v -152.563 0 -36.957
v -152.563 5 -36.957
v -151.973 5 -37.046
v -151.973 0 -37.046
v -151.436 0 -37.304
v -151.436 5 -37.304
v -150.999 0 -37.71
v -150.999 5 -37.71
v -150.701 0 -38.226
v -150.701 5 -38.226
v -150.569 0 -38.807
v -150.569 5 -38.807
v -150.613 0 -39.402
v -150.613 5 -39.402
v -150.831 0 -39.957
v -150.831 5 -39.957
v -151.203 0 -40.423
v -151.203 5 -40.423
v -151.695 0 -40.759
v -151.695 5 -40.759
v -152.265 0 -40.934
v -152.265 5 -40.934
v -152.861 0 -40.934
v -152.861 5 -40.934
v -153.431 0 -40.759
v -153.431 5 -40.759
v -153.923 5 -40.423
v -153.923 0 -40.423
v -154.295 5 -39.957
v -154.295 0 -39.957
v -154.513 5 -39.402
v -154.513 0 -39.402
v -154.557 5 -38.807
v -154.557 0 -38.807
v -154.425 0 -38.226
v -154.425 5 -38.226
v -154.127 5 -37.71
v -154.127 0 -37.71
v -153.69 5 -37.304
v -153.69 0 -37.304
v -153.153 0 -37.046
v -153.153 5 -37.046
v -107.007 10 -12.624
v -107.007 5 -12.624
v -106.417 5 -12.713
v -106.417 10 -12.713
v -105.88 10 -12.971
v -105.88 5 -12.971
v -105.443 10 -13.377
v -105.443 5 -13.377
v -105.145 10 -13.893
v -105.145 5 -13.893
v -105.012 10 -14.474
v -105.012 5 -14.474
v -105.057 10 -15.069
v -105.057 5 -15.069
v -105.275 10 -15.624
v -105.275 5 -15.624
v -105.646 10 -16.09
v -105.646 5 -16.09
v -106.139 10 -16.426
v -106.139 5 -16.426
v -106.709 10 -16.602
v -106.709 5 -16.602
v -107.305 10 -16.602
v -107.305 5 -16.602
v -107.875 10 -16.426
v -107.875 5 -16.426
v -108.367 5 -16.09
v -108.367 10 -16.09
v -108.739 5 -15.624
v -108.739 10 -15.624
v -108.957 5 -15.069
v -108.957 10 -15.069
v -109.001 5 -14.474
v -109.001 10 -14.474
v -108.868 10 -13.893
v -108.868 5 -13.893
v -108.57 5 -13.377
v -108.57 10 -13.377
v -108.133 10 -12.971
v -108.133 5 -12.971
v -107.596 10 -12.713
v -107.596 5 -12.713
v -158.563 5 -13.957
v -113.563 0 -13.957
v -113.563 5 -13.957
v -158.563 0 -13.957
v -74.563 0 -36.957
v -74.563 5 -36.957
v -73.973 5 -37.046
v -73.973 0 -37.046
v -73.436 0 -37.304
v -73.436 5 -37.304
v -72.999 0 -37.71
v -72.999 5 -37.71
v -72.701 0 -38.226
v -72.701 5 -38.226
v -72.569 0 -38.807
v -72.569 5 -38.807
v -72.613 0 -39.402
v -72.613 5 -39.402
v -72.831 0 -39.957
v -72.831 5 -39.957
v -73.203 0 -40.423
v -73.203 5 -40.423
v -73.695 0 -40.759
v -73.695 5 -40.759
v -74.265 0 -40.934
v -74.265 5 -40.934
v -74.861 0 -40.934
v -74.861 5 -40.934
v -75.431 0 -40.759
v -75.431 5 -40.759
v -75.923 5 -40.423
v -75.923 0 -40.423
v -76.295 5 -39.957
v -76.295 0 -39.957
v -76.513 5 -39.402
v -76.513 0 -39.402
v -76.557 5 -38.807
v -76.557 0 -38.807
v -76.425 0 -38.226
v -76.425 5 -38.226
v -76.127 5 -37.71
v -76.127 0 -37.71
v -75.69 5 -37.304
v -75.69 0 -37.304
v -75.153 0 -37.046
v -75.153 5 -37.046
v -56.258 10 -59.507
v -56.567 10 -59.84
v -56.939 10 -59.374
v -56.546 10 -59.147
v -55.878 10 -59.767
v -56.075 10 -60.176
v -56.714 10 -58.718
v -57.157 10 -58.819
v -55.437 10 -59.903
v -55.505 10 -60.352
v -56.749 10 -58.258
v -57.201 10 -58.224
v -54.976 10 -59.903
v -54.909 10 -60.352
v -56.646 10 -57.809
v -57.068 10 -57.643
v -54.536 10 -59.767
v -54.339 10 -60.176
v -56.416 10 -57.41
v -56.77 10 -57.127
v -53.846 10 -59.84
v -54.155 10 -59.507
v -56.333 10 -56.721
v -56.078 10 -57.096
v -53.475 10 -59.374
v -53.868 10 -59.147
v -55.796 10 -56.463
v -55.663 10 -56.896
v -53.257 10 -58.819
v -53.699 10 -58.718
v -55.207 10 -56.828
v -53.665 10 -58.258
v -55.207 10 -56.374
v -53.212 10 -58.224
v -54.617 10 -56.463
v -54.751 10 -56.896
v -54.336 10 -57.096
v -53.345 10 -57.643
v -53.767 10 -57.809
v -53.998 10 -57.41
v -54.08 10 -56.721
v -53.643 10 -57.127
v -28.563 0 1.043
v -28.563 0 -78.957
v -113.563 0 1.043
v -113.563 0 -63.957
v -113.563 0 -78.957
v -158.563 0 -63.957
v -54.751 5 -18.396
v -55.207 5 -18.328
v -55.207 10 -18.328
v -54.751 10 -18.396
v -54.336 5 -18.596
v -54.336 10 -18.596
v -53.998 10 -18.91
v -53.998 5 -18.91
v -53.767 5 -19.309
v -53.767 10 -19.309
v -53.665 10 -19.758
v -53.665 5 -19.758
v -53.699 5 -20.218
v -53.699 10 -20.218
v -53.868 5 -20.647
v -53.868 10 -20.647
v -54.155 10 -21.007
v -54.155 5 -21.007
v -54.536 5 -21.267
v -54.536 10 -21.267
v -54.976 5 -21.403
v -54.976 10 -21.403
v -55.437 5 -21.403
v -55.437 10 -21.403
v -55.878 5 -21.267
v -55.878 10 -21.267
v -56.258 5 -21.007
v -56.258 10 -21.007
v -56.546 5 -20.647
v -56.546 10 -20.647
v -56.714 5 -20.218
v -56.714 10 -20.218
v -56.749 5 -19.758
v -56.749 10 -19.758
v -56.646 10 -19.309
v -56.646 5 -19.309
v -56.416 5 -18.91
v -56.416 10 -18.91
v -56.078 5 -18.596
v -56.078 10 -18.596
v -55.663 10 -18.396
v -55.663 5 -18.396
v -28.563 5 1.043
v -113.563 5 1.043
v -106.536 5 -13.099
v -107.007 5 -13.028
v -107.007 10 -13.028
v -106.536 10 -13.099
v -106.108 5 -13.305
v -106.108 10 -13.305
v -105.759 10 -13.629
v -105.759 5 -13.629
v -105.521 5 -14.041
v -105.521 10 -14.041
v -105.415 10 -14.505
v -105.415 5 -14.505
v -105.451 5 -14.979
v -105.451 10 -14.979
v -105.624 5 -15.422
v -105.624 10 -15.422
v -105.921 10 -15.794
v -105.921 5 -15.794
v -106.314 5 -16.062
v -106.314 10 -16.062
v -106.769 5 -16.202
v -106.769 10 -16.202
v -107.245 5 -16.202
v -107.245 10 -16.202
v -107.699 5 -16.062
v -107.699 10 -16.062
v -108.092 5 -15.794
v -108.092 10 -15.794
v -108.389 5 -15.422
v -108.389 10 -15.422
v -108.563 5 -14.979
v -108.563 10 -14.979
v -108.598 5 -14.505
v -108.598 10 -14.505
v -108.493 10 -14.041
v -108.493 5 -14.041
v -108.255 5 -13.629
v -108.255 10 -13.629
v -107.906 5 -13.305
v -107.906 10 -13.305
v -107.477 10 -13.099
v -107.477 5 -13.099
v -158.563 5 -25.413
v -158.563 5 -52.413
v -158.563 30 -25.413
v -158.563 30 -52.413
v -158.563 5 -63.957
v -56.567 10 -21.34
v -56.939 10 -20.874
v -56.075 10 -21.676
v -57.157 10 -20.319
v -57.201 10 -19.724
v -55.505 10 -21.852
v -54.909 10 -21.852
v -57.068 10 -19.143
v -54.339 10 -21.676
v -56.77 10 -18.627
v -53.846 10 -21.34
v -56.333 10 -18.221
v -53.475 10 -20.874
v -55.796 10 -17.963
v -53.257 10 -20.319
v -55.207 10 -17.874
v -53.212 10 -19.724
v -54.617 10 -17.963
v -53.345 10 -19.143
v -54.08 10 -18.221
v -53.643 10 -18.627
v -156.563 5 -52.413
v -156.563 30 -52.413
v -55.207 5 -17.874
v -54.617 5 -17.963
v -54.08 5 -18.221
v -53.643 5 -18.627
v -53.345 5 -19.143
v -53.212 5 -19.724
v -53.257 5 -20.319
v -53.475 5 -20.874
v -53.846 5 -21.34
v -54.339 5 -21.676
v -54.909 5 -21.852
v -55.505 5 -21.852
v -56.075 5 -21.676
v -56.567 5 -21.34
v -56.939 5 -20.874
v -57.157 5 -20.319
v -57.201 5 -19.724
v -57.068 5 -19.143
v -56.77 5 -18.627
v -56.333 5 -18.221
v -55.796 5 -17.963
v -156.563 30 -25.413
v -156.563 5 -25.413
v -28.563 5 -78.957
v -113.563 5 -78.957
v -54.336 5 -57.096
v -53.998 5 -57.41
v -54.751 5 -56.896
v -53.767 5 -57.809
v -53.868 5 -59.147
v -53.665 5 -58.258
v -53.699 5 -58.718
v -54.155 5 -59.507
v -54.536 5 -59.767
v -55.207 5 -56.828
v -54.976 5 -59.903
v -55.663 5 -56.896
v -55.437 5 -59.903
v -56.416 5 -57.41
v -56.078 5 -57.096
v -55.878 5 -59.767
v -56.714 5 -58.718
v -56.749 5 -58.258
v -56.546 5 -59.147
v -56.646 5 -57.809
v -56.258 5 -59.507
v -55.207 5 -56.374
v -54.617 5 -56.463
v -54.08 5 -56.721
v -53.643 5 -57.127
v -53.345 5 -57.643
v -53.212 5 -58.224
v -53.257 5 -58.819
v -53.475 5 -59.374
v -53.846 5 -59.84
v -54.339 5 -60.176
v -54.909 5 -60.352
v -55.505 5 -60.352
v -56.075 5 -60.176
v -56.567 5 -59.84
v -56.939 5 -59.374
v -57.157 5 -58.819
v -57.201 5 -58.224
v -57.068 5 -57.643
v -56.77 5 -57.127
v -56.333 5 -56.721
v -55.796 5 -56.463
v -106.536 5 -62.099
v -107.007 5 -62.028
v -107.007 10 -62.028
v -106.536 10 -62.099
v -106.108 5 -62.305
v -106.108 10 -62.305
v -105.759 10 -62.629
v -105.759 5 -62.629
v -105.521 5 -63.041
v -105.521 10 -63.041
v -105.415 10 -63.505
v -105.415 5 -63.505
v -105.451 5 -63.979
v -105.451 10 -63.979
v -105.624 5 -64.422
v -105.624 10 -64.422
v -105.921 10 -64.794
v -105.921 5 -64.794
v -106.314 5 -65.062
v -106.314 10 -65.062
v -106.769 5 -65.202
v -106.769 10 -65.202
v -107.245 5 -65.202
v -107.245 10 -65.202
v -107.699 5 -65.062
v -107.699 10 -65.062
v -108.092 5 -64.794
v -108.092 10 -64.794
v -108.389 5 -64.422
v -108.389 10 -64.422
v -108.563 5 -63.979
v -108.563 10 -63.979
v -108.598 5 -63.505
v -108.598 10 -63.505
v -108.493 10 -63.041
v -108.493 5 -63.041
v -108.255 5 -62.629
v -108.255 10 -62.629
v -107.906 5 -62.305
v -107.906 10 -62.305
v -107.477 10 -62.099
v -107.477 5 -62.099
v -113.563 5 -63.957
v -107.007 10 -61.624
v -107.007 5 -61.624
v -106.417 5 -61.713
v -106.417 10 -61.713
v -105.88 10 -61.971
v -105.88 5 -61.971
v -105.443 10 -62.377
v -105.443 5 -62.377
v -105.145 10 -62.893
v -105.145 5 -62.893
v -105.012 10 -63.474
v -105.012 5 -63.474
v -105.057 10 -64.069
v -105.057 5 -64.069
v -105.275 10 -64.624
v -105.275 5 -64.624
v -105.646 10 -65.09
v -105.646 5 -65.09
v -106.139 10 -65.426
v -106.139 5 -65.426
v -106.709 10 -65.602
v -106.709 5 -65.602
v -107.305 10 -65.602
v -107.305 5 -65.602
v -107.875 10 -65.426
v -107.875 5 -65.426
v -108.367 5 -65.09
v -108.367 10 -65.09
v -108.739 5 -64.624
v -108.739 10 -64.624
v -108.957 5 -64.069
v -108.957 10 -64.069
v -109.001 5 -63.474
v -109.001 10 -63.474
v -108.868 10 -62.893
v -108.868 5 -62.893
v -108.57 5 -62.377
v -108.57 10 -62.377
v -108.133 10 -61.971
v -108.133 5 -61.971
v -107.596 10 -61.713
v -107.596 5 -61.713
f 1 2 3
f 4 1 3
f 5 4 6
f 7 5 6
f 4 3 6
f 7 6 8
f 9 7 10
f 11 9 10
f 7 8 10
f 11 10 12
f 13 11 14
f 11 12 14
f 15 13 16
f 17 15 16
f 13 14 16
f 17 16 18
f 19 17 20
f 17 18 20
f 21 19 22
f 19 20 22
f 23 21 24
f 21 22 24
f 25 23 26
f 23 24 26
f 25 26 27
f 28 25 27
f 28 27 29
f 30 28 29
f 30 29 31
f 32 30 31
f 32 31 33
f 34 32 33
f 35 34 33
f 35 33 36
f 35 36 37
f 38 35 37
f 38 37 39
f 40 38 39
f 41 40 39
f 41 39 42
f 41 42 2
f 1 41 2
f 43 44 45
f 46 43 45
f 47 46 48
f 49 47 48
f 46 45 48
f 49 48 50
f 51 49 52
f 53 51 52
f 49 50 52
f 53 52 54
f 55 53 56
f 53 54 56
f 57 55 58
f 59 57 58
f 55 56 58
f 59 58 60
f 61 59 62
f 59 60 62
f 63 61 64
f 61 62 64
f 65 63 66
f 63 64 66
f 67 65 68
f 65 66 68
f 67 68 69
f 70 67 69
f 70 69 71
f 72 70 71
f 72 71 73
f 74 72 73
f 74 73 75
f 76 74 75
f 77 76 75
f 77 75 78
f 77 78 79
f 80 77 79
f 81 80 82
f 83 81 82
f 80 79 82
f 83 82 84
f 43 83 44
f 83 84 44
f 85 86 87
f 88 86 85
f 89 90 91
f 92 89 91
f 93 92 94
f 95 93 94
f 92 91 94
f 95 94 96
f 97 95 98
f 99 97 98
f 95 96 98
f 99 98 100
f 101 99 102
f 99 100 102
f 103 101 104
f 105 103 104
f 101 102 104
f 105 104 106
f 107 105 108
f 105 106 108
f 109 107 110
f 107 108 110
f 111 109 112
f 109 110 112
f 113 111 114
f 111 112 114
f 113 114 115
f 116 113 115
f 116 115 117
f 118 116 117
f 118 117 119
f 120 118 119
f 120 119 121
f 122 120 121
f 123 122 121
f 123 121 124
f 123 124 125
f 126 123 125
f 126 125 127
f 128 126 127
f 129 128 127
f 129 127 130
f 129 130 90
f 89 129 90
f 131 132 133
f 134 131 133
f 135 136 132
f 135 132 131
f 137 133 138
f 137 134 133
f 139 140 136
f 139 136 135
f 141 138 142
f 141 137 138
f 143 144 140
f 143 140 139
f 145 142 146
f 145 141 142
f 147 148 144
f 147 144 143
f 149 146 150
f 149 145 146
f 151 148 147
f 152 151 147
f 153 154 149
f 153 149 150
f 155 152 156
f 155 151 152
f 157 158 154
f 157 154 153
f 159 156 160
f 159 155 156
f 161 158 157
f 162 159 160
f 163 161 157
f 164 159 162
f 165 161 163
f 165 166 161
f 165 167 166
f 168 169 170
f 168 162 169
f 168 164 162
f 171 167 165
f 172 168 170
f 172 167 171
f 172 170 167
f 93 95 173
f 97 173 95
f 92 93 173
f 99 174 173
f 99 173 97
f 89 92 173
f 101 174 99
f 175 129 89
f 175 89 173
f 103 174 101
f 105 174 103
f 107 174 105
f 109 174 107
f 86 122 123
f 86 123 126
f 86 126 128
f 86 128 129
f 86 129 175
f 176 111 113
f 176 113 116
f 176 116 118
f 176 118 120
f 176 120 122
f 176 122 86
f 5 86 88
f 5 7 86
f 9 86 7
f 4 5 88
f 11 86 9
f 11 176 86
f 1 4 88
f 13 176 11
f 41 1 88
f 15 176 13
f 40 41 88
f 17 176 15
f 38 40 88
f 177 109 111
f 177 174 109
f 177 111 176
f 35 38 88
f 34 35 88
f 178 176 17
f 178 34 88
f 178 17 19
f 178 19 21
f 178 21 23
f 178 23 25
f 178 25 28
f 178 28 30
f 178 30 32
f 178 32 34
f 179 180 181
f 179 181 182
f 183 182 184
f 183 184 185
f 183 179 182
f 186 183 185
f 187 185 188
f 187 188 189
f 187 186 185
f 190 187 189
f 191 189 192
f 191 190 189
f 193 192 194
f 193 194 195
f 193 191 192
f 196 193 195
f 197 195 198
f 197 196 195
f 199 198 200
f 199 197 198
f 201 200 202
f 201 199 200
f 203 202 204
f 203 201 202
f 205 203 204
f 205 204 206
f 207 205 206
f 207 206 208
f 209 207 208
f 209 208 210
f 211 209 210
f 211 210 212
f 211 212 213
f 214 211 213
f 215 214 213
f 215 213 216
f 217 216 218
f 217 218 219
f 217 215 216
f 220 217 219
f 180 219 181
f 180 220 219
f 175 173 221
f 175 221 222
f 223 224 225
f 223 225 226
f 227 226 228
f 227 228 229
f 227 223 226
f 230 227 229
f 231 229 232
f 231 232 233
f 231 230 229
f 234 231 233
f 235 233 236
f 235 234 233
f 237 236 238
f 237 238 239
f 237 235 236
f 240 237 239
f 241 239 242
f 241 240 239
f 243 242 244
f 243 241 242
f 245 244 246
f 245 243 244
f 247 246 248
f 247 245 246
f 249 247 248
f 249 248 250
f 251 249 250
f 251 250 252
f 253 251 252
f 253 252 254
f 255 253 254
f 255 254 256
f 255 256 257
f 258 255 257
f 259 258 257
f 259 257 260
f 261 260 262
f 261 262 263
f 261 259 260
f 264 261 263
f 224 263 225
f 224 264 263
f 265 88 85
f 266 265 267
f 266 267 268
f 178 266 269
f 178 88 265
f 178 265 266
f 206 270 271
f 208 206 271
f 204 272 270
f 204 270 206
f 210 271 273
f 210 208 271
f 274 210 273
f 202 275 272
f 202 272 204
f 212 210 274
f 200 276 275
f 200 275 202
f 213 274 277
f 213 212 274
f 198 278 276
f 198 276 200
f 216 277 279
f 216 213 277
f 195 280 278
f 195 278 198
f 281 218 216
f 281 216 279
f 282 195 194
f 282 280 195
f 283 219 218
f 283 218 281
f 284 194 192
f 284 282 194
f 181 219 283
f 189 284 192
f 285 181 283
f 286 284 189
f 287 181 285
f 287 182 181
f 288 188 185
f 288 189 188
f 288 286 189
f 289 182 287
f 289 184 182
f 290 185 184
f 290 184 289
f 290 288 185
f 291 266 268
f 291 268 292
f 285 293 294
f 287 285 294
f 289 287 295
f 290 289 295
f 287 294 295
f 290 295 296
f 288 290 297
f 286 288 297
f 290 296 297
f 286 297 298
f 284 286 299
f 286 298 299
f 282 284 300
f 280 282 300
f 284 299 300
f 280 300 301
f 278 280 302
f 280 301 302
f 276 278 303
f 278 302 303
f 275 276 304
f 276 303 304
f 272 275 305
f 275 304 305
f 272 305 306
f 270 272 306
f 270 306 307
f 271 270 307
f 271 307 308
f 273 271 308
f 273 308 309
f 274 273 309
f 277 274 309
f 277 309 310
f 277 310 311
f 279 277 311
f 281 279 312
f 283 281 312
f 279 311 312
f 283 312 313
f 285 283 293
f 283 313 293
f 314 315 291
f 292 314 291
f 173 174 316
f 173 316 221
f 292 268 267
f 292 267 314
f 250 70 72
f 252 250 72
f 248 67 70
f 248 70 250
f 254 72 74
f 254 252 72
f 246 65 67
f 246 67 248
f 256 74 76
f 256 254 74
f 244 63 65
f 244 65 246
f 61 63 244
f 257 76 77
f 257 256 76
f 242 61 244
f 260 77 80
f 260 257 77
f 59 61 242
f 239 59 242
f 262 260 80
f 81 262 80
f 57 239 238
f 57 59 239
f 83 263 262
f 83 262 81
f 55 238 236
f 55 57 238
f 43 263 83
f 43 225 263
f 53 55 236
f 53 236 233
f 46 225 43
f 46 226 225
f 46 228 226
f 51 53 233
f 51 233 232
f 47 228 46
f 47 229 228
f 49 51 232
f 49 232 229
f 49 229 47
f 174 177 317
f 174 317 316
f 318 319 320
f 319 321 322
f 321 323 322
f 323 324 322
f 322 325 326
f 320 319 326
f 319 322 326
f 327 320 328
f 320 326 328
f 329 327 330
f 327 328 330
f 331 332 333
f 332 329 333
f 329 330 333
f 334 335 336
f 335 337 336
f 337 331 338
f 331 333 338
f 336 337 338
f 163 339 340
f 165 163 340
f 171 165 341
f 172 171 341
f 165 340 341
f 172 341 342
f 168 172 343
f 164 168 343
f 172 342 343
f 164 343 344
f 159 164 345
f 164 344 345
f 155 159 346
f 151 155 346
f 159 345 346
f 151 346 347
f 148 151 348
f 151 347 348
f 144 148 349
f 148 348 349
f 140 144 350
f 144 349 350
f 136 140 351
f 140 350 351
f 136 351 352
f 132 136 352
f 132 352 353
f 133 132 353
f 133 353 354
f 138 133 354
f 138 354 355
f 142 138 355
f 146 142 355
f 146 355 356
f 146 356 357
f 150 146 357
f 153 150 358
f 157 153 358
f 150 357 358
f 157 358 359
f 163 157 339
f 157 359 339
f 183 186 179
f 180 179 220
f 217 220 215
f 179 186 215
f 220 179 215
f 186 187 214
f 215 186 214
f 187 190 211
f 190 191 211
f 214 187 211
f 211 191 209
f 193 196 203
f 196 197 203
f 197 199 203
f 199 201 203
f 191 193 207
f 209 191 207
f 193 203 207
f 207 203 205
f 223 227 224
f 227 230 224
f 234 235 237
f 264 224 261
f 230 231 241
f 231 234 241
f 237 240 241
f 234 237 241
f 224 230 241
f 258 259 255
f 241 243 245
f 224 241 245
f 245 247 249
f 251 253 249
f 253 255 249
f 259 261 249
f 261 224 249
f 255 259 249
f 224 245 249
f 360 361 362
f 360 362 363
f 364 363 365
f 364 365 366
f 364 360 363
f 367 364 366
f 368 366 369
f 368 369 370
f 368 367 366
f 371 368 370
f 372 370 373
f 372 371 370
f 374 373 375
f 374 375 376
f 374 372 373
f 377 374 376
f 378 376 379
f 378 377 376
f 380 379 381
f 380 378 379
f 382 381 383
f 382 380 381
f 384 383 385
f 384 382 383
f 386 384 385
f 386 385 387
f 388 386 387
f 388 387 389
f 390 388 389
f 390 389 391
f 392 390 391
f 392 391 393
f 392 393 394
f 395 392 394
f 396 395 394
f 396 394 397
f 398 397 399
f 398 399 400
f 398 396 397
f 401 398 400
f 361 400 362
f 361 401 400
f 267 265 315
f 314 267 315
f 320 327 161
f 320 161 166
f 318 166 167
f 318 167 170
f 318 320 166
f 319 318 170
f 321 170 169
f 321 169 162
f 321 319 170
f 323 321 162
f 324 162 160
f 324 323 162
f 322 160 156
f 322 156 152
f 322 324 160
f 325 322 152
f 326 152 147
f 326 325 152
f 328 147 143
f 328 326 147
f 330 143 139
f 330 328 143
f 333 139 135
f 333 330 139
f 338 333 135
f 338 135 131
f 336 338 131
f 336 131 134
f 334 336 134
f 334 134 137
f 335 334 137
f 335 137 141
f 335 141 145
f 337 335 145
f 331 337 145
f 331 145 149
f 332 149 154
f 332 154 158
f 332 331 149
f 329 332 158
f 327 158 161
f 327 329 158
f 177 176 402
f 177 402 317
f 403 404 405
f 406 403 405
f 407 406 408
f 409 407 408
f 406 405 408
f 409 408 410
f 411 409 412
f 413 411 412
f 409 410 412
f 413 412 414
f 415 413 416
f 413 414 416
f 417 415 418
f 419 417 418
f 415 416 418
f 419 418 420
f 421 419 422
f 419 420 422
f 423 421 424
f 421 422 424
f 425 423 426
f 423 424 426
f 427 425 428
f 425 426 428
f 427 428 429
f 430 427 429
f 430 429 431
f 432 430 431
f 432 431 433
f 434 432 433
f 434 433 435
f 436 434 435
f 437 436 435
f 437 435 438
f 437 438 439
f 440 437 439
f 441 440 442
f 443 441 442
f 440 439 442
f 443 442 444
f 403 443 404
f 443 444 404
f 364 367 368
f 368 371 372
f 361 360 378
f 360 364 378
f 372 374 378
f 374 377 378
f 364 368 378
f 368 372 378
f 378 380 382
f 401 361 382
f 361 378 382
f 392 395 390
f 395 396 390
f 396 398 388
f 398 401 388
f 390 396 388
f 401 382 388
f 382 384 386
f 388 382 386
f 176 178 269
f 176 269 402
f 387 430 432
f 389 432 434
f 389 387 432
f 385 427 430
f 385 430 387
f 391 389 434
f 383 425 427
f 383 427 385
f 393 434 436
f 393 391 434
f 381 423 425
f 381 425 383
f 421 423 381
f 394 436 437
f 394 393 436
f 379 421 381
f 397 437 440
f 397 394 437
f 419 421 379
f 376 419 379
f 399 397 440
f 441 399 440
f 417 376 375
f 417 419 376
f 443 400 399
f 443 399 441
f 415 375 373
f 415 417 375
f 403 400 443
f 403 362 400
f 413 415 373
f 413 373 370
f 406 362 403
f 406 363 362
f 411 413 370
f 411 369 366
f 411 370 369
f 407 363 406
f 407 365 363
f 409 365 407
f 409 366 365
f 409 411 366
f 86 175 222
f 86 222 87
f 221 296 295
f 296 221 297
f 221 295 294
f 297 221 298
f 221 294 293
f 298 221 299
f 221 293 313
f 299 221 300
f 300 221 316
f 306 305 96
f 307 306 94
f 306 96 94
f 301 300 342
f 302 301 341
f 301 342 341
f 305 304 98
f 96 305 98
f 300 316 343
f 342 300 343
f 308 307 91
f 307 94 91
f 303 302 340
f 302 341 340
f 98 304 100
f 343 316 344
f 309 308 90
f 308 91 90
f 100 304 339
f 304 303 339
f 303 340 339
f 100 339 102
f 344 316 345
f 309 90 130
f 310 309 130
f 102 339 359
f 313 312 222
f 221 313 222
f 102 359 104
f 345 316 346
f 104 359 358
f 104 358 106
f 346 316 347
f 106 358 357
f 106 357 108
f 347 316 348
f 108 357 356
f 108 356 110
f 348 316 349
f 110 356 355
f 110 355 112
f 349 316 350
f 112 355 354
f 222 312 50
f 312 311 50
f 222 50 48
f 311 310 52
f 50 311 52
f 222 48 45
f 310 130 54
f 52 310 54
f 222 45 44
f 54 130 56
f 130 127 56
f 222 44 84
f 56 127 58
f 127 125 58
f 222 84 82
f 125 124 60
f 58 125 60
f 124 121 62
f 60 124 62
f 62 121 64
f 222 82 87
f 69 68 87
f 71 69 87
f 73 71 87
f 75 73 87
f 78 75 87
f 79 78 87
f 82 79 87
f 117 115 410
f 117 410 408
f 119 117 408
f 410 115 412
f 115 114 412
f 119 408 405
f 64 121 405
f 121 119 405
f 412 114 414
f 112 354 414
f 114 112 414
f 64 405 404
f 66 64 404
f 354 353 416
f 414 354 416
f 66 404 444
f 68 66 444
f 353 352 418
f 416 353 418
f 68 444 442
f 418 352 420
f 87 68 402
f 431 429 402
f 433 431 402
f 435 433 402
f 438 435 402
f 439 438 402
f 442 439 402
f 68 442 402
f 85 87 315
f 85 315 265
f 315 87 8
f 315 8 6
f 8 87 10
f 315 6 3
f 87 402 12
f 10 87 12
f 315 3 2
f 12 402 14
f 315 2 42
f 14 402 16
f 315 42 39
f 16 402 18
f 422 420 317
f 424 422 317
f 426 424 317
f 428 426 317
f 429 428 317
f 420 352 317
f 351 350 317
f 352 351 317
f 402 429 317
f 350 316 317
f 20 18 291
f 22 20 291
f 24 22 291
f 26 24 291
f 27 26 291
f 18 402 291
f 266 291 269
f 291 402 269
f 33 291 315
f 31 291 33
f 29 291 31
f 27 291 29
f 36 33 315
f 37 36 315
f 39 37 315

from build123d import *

# Parameters (mm, degrees)
BOSS_EXTRUDE2_DEPTH = 5
SKETCH3_R           = 2
CUT_EXTRUDE1_DEPTH  = 18
SKETCH6_R           = 2
SKETCH6_R_2         = 1.596148068
SKETCH6_R_3         = 1.596152716
SKETCH6_R_4         = 1.546268175
SKETCH6_R_5         = 1.546272671
BOSS_EXTRUDE3_DEPTH = 5
SKETCH9_W           = 2
SKETCH9_H           = 27
BOSS_EXTRUDE5_DEPTH = 25


with BuildPart() as part:
    # Sketch2 → Boss-Extrude2 (new body)
    with BuildSketch(Plane(origin=(0, 0, 0), x_dir=(1, 0, 0), z_dir=(0, 1, 0))):
        Polygon((-113.562992126, 63.956692913), (-113.562992126, 78.956692913), (-28.562992126, 78.956692913), (-28.562992126, -1.043307087), (-113.562992126, -1.043307087), (-113.562992126, 13.956692913), (-158.562992126, 13.956692913), (-158.562992126, 63.956692913), align=None)
    extrude(amount=BOSS_EXTRUDE2_DEPTH)

    # Sketch3 → Cut-Extrude1 (cut)
    with BuildSketch(Plane(origin=(0, 5, 0), x_dir=(1, 0, 0), z_dir=(0, 1, 0))):
        with Locations(Location((-74.562992126, 38.956692913, 0), (0, 0, 270))):
            Circle(SKETCH3_R)
        with Locations(Location((-152.562992126, 38.956692913, 0), (0, 0, 270))):
            Circle(SKETCH3_R)
    extrude(amount=-CUT_EXTRUDE1_DEPTH, mode=Mode.SUBTRACT)

    # Sketch6 → Boss-Extrude3 (add)
    # profile 1 of 4: a face of its own
    with BuildSketch(Plane(origin=(0, 5, 0), x_dir=(1, 0, 0), z_dir=(0, 1, 0))):
        with Locations(Location((-107.006745746, 63.623929763, 0), (0, 0, 270))):
            Circle(SKETCH6_R)
        with Locations(Location((-107.006745746, 63.623929763, 0), (0, 0, 270))):
            Circle(SKETCH6_R_2, mode=Mode.SUBTRACT)
    # profile 2 of 4: a face of its own
    with BuildSketch(Plane(origin=(0, 5, 0), x_dir=(1, 0, 0), z_dir=(0, 1, 0))):
        with Locations(Location((-107.006746212, 14.623929182, 0), (0, 0, 270))):
            Circle(SKETCH6_R)
        with Locations(Location((-107.006746212, 14.623929182, 0), (0, 0, 270))):
            Circle(SKETCH6_R_3, mode=Mode.SUBTRACT)
    # profile 3 of 4: a face of its own
    with BuildSketch(Plane(origin=(0, 5, 0), x_dir=(1, 0, 0), z_dir=(0, 1, 0))):
        with Locations(Location((-55.206742331, 19.873926739, 0), (0, 0, 270))):
            Circle(SKETCH6_R)
        with Locations(Location((-55.206742331, 19.873926739, 0), (0, 0, 270))):
            Circle(SKETCH6_R_4, mode=Mode.SUBTRACT)
    # profile 4 of 4: a face of its own
    with BuildSketch(Plane(origin=(0, 5, 0), x_dir=(1, 0, 0), z_dir=(0, 1, 0))):
        with Locations(Location((-55.206746033, 58.373928486, 0), (0, 0, 270))):
            Circle(SKETCH6_R)
        with Locations(Location((-55.206746033, 58.373928486, 0), (0, 0, 270))):
            Circle(SKETCH6_R_5, mode=Mode.SUBTRACT)
    extrude(amount=BOSS_EXTRUDE3_DEPTH)

    # Sketch9 → Boss-Extrude5 (add)
    with BuildSketch(Plane(origin=(0, 5, 0), x_dir=(1, 0, 0), z_dir=(0, 1, 0))):
        with Locations((-157.562992126, 38.912665697)):
            Rectangle(SKETCH9_W, SKETCH9_H)
    extrude(amount=BOSS_EXTRUDE5_DEPTH)


solid = part.part
